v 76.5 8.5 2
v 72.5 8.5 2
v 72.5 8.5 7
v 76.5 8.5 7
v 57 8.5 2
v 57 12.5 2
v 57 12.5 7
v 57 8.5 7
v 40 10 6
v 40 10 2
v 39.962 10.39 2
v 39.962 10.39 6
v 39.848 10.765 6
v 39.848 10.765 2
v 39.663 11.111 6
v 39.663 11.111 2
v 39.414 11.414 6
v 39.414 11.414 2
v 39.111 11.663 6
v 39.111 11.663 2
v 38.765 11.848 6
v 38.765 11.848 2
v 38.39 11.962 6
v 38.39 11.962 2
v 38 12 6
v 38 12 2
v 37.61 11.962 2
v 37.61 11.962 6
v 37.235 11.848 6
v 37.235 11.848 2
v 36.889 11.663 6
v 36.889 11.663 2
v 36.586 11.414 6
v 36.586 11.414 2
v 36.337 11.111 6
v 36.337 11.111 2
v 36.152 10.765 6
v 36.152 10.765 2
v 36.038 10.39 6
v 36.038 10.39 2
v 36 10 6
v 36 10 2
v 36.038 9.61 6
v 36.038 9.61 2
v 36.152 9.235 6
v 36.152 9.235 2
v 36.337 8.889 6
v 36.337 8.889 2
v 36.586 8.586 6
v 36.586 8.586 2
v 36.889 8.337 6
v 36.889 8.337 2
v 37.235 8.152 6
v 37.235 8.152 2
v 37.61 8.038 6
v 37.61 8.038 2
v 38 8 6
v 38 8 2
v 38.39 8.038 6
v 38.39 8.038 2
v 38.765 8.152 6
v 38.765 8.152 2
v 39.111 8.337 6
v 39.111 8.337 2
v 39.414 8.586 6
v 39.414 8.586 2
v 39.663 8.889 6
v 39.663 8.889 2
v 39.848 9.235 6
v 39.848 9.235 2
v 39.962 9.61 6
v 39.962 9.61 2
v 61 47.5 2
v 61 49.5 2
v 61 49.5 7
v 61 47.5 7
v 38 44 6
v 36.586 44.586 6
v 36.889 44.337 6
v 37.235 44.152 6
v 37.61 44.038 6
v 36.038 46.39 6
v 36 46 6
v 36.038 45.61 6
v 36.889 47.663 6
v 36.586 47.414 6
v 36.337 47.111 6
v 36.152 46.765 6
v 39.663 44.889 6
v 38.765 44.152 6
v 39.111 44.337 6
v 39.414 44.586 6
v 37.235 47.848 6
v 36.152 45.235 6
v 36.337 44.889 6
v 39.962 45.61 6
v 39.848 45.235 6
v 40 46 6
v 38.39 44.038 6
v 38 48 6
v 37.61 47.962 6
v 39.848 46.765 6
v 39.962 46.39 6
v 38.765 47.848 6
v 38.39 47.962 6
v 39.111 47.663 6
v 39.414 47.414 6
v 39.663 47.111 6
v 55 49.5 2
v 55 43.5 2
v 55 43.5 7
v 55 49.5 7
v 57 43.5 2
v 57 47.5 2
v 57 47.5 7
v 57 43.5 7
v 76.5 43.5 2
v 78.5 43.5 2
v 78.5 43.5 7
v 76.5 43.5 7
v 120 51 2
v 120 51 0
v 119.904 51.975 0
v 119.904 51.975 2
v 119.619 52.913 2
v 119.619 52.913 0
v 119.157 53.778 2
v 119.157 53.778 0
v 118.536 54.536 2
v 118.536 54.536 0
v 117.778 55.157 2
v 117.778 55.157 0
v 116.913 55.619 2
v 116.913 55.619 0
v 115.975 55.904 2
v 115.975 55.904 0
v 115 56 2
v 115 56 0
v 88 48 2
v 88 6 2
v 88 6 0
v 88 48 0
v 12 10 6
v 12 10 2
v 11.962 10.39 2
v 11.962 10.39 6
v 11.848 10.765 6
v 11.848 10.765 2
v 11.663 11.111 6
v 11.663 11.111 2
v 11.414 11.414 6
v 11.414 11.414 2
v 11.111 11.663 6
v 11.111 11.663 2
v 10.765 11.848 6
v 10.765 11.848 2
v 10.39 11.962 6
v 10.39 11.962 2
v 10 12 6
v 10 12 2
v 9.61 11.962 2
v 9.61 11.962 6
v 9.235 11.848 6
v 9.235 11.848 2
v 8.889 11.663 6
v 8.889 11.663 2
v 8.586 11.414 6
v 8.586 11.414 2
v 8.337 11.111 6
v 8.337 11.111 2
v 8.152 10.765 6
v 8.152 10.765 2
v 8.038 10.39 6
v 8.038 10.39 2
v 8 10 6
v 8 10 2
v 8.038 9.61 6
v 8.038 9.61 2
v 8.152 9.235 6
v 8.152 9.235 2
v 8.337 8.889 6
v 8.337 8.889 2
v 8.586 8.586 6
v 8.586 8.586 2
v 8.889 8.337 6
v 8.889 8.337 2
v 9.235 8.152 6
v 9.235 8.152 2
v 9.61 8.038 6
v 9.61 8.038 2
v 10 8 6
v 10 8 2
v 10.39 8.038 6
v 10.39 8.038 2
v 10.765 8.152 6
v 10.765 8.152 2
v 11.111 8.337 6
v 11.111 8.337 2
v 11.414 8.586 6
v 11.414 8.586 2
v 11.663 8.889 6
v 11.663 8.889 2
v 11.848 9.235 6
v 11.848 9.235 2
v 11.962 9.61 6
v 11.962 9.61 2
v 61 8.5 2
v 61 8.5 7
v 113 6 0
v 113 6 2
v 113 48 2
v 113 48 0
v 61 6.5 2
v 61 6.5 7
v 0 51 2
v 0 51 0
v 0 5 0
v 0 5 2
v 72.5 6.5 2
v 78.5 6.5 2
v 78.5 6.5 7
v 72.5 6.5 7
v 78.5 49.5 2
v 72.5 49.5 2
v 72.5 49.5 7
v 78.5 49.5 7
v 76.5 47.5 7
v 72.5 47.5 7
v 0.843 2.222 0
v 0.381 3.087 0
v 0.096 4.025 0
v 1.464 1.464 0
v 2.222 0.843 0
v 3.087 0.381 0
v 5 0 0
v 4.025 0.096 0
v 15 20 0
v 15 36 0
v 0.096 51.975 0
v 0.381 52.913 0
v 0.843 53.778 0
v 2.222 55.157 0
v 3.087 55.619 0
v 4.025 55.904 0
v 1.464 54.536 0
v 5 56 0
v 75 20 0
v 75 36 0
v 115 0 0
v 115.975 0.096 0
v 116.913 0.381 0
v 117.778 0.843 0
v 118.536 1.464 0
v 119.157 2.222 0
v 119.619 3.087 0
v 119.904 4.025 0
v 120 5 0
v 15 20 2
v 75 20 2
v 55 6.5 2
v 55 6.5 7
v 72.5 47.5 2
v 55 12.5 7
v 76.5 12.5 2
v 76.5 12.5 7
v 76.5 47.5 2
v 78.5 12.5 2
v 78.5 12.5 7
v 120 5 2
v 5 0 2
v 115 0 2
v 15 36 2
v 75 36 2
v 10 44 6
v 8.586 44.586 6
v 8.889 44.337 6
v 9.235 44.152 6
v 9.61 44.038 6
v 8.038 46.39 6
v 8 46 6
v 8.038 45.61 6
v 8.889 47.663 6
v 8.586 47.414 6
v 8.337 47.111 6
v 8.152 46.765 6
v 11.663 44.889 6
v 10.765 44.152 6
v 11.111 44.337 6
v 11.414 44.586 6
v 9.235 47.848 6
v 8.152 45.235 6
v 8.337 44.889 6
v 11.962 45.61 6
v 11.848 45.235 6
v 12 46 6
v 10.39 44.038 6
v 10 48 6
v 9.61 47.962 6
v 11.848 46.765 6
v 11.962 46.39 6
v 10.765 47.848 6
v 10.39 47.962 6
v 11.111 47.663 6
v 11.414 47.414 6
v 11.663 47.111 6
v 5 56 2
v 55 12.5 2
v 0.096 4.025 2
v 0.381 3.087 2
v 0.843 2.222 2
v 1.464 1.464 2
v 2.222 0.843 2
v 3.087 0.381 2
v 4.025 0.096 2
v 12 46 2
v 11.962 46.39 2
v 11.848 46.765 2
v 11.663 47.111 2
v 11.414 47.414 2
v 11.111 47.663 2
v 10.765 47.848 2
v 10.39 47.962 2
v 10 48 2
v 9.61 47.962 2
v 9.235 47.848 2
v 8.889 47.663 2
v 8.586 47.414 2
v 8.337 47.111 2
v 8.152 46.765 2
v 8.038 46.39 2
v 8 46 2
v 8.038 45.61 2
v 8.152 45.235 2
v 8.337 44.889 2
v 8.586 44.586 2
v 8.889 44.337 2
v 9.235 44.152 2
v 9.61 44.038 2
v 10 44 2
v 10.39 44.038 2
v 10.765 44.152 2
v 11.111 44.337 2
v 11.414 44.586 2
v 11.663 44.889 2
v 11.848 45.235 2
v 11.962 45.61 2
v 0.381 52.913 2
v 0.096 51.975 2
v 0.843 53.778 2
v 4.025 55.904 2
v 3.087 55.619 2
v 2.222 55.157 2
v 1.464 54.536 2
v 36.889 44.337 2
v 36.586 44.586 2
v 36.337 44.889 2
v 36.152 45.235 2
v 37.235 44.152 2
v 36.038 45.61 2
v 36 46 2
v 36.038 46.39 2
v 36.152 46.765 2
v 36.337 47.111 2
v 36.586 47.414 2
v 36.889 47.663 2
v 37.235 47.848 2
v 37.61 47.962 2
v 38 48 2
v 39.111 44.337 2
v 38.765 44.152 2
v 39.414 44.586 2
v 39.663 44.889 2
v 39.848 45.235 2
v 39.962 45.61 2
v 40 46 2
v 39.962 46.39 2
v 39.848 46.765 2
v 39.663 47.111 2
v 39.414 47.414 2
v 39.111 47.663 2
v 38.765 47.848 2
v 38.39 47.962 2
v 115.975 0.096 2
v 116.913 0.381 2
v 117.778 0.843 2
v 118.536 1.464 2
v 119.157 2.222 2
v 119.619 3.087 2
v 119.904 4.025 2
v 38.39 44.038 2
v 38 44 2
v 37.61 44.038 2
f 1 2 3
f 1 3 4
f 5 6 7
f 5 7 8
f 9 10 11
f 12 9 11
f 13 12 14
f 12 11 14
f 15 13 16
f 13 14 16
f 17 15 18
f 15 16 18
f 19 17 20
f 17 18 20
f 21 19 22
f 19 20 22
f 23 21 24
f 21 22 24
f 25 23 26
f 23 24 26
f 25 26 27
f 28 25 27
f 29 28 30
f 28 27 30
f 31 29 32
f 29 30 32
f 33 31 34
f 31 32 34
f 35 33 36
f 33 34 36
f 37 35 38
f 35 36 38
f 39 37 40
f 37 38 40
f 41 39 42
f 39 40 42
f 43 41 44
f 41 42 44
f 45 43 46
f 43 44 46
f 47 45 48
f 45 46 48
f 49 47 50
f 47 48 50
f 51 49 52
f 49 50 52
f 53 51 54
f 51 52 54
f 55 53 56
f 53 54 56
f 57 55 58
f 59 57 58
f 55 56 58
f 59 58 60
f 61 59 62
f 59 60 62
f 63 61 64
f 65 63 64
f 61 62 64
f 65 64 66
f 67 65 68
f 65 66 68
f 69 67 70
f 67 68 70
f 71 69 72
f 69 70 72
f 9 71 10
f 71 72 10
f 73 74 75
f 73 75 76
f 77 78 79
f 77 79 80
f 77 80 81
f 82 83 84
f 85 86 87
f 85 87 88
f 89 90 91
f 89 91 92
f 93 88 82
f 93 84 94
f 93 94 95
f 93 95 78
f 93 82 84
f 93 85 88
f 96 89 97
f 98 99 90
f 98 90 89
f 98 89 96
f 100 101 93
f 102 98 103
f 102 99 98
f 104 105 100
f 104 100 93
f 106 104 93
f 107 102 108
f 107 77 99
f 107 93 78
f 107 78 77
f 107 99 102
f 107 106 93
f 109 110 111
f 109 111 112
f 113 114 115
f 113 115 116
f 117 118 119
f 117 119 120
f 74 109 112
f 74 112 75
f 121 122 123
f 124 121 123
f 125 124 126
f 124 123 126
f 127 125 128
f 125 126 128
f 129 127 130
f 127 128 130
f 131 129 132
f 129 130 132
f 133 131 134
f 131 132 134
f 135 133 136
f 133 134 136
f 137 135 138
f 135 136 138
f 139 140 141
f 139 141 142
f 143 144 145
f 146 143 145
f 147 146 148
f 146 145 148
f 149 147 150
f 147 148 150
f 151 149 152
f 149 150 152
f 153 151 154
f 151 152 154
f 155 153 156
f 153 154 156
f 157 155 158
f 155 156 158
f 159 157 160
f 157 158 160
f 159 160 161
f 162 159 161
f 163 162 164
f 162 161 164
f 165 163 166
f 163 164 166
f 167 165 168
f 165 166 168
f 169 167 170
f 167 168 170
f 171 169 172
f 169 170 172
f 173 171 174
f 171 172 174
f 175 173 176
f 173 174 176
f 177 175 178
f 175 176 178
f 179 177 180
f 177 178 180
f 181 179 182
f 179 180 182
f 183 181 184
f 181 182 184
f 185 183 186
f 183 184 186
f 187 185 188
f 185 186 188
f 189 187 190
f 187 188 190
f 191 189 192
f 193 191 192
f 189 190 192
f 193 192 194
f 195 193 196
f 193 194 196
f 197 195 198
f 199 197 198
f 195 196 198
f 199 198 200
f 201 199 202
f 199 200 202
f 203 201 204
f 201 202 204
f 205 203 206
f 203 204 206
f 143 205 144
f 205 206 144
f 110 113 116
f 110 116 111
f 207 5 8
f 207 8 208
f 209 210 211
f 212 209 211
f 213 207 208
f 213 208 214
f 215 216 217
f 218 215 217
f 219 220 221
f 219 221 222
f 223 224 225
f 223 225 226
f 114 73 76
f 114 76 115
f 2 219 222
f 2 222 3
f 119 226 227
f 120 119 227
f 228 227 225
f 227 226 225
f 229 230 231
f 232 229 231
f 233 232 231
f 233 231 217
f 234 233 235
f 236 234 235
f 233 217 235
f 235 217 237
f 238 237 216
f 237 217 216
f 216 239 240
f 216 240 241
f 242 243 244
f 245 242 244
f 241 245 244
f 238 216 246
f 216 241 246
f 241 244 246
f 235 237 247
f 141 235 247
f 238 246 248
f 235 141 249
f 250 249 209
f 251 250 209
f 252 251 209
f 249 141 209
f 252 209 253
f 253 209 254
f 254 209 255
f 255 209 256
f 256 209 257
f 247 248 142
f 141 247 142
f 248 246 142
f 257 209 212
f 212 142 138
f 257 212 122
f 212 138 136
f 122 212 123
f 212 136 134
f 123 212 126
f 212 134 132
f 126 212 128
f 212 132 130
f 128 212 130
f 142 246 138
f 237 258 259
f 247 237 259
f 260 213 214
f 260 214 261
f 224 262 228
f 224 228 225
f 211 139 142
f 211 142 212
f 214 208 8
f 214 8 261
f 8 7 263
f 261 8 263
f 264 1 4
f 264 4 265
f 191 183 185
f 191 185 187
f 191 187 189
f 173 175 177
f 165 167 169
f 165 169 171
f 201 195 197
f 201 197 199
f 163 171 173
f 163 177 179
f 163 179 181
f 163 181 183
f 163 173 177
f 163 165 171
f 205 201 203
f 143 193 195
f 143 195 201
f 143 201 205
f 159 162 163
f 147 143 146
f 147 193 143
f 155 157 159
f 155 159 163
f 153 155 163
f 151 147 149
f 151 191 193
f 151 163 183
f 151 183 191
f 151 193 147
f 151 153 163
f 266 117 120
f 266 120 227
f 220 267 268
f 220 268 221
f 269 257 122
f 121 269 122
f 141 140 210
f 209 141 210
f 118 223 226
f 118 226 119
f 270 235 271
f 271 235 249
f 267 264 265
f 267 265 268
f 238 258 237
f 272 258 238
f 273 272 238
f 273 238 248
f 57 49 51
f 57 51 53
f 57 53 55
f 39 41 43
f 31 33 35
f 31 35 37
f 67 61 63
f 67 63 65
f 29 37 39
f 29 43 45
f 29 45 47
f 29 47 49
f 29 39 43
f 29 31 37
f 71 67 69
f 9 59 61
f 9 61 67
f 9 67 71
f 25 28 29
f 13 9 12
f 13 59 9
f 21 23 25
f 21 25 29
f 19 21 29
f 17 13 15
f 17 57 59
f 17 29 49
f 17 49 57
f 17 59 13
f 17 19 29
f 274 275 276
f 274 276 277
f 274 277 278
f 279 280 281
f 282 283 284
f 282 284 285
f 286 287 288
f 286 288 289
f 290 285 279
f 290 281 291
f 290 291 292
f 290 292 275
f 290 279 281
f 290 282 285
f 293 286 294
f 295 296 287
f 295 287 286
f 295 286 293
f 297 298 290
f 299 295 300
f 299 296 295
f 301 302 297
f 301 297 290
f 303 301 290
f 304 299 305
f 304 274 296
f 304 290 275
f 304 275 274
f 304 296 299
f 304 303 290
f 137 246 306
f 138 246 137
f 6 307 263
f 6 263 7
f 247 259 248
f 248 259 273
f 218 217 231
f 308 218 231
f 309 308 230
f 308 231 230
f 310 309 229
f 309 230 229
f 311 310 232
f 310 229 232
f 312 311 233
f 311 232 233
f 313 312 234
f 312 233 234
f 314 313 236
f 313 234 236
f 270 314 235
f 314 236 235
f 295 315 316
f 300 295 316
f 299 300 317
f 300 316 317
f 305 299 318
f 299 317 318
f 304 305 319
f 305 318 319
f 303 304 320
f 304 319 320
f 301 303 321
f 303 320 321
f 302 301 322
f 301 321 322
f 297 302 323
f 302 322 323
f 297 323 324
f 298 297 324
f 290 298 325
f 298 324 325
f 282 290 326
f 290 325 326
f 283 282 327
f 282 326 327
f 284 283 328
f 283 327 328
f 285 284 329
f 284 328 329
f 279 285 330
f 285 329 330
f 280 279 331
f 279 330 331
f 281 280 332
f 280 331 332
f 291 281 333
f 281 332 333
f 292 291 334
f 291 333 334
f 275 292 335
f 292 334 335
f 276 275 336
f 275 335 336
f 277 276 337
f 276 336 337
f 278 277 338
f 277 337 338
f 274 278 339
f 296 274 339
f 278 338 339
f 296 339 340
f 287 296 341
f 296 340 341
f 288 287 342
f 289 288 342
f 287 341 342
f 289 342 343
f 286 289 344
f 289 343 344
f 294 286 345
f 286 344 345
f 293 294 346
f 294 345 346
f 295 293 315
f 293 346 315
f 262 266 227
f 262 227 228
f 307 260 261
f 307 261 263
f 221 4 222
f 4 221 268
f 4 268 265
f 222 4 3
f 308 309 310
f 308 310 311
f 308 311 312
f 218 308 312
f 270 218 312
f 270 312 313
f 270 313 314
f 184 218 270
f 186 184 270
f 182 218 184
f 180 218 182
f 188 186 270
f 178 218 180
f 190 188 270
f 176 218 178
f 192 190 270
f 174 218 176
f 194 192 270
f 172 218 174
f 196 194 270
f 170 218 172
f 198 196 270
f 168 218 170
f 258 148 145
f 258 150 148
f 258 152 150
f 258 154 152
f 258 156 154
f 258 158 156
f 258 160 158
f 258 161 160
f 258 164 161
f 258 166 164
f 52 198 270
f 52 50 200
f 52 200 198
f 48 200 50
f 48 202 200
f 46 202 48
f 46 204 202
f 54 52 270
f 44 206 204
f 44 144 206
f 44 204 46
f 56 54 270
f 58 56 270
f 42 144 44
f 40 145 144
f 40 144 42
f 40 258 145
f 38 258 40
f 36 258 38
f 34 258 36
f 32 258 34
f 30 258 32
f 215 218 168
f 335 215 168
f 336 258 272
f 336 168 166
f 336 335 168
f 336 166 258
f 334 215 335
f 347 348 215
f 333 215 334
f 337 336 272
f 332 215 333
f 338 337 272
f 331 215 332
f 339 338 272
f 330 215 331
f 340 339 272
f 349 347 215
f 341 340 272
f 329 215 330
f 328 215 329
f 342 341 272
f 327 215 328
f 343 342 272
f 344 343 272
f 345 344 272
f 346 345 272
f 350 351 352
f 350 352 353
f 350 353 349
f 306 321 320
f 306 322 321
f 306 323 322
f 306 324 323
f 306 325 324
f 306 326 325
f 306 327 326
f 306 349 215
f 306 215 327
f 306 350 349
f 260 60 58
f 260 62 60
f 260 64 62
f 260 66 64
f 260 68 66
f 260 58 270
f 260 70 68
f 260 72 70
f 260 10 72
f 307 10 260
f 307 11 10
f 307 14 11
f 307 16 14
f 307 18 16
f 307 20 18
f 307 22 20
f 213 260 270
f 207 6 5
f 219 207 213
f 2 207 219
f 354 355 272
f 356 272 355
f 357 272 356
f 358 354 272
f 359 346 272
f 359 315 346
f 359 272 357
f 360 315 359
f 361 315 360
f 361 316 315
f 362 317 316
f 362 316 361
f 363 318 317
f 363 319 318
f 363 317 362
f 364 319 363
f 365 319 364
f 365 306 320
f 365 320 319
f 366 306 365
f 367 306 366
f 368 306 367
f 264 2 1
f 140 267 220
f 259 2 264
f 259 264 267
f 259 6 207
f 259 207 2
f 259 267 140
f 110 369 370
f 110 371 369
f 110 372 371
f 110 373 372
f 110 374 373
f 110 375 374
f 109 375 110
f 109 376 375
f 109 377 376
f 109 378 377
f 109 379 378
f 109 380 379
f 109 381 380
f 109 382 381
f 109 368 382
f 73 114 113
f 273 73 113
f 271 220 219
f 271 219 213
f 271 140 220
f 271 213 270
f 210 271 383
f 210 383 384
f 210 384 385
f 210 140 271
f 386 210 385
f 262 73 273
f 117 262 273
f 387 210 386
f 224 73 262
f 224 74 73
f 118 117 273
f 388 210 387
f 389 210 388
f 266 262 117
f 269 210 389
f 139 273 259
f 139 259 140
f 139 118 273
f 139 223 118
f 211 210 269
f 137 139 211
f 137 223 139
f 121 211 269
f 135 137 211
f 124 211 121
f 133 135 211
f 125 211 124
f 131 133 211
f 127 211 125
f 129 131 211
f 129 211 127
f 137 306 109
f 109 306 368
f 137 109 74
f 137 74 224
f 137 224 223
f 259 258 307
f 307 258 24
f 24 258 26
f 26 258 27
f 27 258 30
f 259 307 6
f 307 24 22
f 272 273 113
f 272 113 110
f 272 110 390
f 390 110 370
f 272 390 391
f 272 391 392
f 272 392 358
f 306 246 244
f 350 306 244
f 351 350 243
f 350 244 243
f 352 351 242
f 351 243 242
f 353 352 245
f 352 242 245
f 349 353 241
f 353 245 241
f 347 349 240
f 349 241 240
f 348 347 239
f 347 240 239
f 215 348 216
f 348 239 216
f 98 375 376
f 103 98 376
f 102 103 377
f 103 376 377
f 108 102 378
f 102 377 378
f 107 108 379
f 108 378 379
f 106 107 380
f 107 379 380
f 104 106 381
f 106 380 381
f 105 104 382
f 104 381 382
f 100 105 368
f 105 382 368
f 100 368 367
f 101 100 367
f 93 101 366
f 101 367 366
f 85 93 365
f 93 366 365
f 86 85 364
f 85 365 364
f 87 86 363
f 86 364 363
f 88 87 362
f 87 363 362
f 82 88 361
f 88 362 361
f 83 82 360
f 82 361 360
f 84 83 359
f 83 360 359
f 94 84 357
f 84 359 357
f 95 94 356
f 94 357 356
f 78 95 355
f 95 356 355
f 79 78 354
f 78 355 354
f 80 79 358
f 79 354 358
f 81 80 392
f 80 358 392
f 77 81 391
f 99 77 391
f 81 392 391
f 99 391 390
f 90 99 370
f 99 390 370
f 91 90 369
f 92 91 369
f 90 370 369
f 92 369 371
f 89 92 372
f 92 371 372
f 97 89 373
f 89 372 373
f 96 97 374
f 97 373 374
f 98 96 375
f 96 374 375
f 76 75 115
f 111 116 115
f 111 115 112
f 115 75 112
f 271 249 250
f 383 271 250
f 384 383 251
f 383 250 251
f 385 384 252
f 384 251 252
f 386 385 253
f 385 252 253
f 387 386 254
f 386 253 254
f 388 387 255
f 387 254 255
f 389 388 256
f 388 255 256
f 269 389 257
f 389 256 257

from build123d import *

# Parameters (mm, degrees)
PAD_DEPTH     = 2
SKETCH001_R   = 2
PAD001_DEPTH  = 4
PAD002_DEPTH  = 5
SKETCH003_W   = 60
SKETCH003_H   = 16
SKETCH003_W_2 = 25
SKETCH003_H_2 = 42
POCKET_DEPTH  = 2


with BuildPart() as part:
    # Sketch → Pad (new body)
    with BuildSketch(Plane.XY):
        with BuildLine():
            Line((5.000023, 0), (114.999975, 0))
            ThreePointArc((114.999975, 0), (118.535523, 1.464455), (120, 4.999992))
            Line((120, 4.999992), (120, 51.000008))
            ThreePointArc((120, 51.000008), (118.535523, 54.535545), (114.999975, 56))
            Line((5.000023, 56), (114.999975, 56))
            ThreePointArc((5.000023, 56), (1.464477, 54.535545), (0, 51.000008))
            Line((0, 51.000008), (0, 4.999992))
            ThreePointArc((0, 4.999992), (1.464477, 1.464455), (5.000023, 0))
        make_face()
    extrude(amount=PAD_DEPTH)

    # Sketch001 → Pad001 (new body)
    with BuildSketch(Plane.XY.offset(2)):
        with Locations((10, 46)):
            Circle(SKETCH001_R)
        with Locations((38, 46)):
            Circle(SKETCH001_R)
        with Locations((10, 10)):
            Circle(SKETCH001_R)
        with Locations((38, 10)):
            Circle(SKETCH001_R)
    extrude(amount=PAD001_DEPTH)

    # Sketch002 → Pad002 (new body)
    with BuildSketch(Plane.XY.offset(2)):
        Polygon((55, 43.5), (55, 49.5), (61, 49.5), (61, 47.5), (57, 47.5), (57, 43.5), align=None)
        Polygon((72.5, 47.5), (72.5, 49.5), (78.5, 49.5), (78.5, 43.5), (76.5, 43.5), (76.5, 47.5), align=None)
        Polygon((55, 12.5), (57, 12.5), (57, 8.5), (61, 8.5), (61, 6.5), (55, 6.5), align=None)
        Polygon((76.5, 12.5), (78.5, 12.5), (78.5, 6.5), (72.5, 6.5), (72.5, 8.5), (76.5, 8.5), align=None)
    extrude(amount=PAD002_DEPTH)

    # Sketch003 → Pocket (cut)
    with BuildSketch(Plane.XY.offset(2)):
        with Locations((45, 28)):
            Rectangle(SKETCH003_W, SKETCH003_H)
        with Locations((100.5, 27)):
            Rectangle(SKETCH003_W_2, SKETCH003_H_2)
    extrude(amount=-POCKET_DEPTH, mode=Mode.SUBTRACT)


solid = part.part
